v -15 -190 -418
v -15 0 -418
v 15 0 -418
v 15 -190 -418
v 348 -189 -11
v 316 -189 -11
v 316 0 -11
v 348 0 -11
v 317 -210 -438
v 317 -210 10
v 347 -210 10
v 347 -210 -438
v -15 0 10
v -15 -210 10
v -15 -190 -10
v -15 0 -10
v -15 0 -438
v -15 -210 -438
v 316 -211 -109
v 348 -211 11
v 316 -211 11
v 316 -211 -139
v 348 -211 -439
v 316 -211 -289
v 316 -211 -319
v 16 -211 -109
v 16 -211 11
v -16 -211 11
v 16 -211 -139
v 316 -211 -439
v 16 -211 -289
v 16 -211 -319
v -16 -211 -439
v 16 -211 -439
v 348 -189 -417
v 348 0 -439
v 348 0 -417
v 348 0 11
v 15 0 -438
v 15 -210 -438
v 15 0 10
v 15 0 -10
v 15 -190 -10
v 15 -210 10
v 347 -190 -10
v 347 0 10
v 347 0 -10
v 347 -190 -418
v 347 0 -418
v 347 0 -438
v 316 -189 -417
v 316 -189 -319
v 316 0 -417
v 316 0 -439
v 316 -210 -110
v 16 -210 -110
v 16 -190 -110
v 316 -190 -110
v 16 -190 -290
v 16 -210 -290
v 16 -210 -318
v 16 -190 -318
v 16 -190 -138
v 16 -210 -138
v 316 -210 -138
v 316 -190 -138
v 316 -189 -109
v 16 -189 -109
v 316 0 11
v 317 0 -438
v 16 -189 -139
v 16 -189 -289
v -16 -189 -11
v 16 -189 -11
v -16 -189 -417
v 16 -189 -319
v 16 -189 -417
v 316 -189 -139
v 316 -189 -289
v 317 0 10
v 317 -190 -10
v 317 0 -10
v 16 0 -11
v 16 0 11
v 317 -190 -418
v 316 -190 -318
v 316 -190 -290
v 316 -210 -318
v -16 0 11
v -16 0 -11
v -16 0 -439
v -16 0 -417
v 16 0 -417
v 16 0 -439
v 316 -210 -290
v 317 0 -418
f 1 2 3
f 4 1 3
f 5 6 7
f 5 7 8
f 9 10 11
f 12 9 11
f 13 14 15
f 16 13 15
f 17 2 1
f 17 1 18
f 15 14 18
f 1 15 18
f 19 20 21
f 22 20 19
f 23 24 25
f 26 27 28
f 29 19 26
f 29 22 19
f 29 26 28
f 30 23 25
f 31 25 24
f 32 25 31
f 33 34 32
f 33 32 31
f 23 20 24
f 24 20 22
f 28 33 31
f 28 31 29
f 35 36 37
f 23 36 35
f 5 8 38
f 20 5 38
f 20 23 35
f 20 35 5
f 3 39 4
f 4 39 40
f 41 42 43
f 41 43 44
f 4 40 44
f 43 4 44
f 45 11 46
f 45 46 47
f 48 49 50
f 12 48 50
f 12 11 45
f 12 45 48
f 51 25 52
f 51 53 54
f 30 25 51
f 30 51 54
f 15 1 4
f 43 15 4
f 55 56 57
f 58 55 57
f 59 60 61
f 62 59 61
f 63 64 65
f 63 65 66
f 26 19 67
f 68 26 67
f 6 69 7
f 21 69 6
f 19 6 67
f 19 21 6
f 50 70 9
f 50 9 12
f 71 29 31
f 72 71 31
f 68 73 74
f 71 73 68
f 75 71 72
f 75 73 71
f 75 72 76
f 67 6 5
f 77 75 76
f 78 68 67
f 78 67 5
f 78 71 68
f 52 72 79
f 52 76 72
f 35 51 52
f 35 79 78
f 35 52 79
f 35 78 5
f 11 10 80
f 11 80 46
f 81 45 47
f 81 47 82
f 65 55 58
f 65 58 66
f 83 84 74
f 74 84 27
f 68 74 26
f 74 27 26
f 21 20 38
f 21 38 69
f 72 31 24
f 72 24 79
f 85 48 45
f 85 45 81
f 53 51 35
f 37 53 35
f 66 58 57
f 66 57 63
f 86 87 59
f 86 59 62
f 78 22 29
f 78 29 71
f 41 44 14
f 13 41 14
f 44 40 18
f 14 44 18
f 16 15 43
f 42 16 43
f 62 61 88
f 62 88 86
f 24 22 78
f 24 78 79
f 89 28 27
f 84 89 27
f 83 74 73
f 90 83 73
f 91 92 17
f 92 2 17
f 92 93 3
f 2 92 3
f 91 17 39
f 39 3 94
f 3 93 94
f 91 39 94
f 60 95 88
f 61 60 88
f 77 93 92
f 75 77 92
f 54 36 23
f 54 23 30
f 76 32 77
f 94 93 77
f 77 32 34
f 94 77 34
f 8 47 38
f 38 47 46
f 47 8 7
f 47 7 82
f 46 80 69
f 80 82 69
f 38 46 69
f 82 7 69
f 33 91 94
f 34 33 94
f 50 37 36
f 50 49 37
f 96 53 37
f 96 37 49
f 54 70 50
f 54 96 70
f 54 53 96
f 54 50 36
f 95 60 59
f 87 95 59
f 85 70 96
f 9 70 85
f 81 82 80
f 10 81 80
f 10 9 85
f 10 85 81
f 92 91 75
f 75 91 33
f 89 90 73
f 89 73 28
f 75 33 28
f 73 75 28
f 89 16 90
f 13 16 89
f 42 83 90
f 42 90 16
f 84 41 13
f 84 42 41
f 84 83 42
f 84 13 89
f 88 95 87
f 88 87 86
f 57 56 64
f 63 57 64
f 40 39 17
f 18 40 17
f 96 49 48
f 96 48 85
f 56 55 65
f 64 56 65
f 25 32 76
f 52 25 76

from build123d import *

# Parameters (mm, degrees)
SKETCH1_W           = 32
SKETCH1_H           = 22
SKETCH1_W_2         = 30
SKETCH1_H_2         = 20
SKETCH3_W           = 30
SKETCH3_H           = 22
SKETCH3_W_2         = 28
SKETCH3_H_2         = 20
EXTRUDE_THIN1_DEPTH = 150


with BuildPart() as part:
    # Sweep-Thin1: sweep along a path in Sketch2
    with BuildLine(Plane(origin=(0, 0, 0), x_dir=(0, 0, -1), z_dir=(1, 0, 0))) as sweep_thin1_path:
        Line((0, 0), (0, -200))
        Line((0, -200), (428, -200))
        Line((428, -200), (428, 0))
    # Sketch1 → Sweep-Thin1 (sweep)
    with BuildSketch(Plane(origin=(0, 0, 0), x_dir=(1, 0, 0), z_dir=(0, 1, 0))):
        Rectangle(SKETCH1_W, SKETCH1_H)
        Rectangle(SKETCH1_W_2, SKETCH1_H_2, mode=Mode.SUBTRACT)
    sweep_thin1 = sweep(path=sweep_thin1_path.line, transition=Transition.RIGHT)

    # Sketch3 → Extrude-Thin1 (add)
    # profile 1 of 2: a face of its own
    with BuildSketch(Plane(origin=(16, 0, 0), x_dir=(0, 0, -1), z_dir=(1, 0, 0))):
        with Locations((124, -200)):
            Rectangle(SKETCH3_W, SKETCH3_H)
        with Locations((124, -200)):
            Rectangle(SKETCH3_W_2, SKETCH3_H_2, mode=Mode.SUBTRACT)
    # profile 2 of 2: a face of its own
    with BuildSketch(Plane(origin=(16, 0, 0), x_dir=(0, 0, -1), z_dir=(1, 0, 0))):
        with Locations((304, -200)):
            Rectangle(SKETCH3_W, SKETCH3_H)
        with Locations((304, -200)):
            Rectangle(SKETCH3_W_2, SKETCH3_H_2, mode=Mode.SUBTRACT)
    extrude_thin1 = extrude(amount=EXTRUDE_THIN1_DEPTH)

    # Mirror9: Extrude-Thin1 across plane
    add(extrude_thin1.mirror(Plane(origin=(166, 0, 0), x_dir=(0, 0, 1), z_dir=(1, 0, 0))))

    # Mirror10: Sweep-Thin1 across plane
    add(sweep_thin1.mirror(Plane(origin=(166, 0, 0), x_dir=(0, 0, 1), z_dir=(1, 0, 0))))


solid = part.part
